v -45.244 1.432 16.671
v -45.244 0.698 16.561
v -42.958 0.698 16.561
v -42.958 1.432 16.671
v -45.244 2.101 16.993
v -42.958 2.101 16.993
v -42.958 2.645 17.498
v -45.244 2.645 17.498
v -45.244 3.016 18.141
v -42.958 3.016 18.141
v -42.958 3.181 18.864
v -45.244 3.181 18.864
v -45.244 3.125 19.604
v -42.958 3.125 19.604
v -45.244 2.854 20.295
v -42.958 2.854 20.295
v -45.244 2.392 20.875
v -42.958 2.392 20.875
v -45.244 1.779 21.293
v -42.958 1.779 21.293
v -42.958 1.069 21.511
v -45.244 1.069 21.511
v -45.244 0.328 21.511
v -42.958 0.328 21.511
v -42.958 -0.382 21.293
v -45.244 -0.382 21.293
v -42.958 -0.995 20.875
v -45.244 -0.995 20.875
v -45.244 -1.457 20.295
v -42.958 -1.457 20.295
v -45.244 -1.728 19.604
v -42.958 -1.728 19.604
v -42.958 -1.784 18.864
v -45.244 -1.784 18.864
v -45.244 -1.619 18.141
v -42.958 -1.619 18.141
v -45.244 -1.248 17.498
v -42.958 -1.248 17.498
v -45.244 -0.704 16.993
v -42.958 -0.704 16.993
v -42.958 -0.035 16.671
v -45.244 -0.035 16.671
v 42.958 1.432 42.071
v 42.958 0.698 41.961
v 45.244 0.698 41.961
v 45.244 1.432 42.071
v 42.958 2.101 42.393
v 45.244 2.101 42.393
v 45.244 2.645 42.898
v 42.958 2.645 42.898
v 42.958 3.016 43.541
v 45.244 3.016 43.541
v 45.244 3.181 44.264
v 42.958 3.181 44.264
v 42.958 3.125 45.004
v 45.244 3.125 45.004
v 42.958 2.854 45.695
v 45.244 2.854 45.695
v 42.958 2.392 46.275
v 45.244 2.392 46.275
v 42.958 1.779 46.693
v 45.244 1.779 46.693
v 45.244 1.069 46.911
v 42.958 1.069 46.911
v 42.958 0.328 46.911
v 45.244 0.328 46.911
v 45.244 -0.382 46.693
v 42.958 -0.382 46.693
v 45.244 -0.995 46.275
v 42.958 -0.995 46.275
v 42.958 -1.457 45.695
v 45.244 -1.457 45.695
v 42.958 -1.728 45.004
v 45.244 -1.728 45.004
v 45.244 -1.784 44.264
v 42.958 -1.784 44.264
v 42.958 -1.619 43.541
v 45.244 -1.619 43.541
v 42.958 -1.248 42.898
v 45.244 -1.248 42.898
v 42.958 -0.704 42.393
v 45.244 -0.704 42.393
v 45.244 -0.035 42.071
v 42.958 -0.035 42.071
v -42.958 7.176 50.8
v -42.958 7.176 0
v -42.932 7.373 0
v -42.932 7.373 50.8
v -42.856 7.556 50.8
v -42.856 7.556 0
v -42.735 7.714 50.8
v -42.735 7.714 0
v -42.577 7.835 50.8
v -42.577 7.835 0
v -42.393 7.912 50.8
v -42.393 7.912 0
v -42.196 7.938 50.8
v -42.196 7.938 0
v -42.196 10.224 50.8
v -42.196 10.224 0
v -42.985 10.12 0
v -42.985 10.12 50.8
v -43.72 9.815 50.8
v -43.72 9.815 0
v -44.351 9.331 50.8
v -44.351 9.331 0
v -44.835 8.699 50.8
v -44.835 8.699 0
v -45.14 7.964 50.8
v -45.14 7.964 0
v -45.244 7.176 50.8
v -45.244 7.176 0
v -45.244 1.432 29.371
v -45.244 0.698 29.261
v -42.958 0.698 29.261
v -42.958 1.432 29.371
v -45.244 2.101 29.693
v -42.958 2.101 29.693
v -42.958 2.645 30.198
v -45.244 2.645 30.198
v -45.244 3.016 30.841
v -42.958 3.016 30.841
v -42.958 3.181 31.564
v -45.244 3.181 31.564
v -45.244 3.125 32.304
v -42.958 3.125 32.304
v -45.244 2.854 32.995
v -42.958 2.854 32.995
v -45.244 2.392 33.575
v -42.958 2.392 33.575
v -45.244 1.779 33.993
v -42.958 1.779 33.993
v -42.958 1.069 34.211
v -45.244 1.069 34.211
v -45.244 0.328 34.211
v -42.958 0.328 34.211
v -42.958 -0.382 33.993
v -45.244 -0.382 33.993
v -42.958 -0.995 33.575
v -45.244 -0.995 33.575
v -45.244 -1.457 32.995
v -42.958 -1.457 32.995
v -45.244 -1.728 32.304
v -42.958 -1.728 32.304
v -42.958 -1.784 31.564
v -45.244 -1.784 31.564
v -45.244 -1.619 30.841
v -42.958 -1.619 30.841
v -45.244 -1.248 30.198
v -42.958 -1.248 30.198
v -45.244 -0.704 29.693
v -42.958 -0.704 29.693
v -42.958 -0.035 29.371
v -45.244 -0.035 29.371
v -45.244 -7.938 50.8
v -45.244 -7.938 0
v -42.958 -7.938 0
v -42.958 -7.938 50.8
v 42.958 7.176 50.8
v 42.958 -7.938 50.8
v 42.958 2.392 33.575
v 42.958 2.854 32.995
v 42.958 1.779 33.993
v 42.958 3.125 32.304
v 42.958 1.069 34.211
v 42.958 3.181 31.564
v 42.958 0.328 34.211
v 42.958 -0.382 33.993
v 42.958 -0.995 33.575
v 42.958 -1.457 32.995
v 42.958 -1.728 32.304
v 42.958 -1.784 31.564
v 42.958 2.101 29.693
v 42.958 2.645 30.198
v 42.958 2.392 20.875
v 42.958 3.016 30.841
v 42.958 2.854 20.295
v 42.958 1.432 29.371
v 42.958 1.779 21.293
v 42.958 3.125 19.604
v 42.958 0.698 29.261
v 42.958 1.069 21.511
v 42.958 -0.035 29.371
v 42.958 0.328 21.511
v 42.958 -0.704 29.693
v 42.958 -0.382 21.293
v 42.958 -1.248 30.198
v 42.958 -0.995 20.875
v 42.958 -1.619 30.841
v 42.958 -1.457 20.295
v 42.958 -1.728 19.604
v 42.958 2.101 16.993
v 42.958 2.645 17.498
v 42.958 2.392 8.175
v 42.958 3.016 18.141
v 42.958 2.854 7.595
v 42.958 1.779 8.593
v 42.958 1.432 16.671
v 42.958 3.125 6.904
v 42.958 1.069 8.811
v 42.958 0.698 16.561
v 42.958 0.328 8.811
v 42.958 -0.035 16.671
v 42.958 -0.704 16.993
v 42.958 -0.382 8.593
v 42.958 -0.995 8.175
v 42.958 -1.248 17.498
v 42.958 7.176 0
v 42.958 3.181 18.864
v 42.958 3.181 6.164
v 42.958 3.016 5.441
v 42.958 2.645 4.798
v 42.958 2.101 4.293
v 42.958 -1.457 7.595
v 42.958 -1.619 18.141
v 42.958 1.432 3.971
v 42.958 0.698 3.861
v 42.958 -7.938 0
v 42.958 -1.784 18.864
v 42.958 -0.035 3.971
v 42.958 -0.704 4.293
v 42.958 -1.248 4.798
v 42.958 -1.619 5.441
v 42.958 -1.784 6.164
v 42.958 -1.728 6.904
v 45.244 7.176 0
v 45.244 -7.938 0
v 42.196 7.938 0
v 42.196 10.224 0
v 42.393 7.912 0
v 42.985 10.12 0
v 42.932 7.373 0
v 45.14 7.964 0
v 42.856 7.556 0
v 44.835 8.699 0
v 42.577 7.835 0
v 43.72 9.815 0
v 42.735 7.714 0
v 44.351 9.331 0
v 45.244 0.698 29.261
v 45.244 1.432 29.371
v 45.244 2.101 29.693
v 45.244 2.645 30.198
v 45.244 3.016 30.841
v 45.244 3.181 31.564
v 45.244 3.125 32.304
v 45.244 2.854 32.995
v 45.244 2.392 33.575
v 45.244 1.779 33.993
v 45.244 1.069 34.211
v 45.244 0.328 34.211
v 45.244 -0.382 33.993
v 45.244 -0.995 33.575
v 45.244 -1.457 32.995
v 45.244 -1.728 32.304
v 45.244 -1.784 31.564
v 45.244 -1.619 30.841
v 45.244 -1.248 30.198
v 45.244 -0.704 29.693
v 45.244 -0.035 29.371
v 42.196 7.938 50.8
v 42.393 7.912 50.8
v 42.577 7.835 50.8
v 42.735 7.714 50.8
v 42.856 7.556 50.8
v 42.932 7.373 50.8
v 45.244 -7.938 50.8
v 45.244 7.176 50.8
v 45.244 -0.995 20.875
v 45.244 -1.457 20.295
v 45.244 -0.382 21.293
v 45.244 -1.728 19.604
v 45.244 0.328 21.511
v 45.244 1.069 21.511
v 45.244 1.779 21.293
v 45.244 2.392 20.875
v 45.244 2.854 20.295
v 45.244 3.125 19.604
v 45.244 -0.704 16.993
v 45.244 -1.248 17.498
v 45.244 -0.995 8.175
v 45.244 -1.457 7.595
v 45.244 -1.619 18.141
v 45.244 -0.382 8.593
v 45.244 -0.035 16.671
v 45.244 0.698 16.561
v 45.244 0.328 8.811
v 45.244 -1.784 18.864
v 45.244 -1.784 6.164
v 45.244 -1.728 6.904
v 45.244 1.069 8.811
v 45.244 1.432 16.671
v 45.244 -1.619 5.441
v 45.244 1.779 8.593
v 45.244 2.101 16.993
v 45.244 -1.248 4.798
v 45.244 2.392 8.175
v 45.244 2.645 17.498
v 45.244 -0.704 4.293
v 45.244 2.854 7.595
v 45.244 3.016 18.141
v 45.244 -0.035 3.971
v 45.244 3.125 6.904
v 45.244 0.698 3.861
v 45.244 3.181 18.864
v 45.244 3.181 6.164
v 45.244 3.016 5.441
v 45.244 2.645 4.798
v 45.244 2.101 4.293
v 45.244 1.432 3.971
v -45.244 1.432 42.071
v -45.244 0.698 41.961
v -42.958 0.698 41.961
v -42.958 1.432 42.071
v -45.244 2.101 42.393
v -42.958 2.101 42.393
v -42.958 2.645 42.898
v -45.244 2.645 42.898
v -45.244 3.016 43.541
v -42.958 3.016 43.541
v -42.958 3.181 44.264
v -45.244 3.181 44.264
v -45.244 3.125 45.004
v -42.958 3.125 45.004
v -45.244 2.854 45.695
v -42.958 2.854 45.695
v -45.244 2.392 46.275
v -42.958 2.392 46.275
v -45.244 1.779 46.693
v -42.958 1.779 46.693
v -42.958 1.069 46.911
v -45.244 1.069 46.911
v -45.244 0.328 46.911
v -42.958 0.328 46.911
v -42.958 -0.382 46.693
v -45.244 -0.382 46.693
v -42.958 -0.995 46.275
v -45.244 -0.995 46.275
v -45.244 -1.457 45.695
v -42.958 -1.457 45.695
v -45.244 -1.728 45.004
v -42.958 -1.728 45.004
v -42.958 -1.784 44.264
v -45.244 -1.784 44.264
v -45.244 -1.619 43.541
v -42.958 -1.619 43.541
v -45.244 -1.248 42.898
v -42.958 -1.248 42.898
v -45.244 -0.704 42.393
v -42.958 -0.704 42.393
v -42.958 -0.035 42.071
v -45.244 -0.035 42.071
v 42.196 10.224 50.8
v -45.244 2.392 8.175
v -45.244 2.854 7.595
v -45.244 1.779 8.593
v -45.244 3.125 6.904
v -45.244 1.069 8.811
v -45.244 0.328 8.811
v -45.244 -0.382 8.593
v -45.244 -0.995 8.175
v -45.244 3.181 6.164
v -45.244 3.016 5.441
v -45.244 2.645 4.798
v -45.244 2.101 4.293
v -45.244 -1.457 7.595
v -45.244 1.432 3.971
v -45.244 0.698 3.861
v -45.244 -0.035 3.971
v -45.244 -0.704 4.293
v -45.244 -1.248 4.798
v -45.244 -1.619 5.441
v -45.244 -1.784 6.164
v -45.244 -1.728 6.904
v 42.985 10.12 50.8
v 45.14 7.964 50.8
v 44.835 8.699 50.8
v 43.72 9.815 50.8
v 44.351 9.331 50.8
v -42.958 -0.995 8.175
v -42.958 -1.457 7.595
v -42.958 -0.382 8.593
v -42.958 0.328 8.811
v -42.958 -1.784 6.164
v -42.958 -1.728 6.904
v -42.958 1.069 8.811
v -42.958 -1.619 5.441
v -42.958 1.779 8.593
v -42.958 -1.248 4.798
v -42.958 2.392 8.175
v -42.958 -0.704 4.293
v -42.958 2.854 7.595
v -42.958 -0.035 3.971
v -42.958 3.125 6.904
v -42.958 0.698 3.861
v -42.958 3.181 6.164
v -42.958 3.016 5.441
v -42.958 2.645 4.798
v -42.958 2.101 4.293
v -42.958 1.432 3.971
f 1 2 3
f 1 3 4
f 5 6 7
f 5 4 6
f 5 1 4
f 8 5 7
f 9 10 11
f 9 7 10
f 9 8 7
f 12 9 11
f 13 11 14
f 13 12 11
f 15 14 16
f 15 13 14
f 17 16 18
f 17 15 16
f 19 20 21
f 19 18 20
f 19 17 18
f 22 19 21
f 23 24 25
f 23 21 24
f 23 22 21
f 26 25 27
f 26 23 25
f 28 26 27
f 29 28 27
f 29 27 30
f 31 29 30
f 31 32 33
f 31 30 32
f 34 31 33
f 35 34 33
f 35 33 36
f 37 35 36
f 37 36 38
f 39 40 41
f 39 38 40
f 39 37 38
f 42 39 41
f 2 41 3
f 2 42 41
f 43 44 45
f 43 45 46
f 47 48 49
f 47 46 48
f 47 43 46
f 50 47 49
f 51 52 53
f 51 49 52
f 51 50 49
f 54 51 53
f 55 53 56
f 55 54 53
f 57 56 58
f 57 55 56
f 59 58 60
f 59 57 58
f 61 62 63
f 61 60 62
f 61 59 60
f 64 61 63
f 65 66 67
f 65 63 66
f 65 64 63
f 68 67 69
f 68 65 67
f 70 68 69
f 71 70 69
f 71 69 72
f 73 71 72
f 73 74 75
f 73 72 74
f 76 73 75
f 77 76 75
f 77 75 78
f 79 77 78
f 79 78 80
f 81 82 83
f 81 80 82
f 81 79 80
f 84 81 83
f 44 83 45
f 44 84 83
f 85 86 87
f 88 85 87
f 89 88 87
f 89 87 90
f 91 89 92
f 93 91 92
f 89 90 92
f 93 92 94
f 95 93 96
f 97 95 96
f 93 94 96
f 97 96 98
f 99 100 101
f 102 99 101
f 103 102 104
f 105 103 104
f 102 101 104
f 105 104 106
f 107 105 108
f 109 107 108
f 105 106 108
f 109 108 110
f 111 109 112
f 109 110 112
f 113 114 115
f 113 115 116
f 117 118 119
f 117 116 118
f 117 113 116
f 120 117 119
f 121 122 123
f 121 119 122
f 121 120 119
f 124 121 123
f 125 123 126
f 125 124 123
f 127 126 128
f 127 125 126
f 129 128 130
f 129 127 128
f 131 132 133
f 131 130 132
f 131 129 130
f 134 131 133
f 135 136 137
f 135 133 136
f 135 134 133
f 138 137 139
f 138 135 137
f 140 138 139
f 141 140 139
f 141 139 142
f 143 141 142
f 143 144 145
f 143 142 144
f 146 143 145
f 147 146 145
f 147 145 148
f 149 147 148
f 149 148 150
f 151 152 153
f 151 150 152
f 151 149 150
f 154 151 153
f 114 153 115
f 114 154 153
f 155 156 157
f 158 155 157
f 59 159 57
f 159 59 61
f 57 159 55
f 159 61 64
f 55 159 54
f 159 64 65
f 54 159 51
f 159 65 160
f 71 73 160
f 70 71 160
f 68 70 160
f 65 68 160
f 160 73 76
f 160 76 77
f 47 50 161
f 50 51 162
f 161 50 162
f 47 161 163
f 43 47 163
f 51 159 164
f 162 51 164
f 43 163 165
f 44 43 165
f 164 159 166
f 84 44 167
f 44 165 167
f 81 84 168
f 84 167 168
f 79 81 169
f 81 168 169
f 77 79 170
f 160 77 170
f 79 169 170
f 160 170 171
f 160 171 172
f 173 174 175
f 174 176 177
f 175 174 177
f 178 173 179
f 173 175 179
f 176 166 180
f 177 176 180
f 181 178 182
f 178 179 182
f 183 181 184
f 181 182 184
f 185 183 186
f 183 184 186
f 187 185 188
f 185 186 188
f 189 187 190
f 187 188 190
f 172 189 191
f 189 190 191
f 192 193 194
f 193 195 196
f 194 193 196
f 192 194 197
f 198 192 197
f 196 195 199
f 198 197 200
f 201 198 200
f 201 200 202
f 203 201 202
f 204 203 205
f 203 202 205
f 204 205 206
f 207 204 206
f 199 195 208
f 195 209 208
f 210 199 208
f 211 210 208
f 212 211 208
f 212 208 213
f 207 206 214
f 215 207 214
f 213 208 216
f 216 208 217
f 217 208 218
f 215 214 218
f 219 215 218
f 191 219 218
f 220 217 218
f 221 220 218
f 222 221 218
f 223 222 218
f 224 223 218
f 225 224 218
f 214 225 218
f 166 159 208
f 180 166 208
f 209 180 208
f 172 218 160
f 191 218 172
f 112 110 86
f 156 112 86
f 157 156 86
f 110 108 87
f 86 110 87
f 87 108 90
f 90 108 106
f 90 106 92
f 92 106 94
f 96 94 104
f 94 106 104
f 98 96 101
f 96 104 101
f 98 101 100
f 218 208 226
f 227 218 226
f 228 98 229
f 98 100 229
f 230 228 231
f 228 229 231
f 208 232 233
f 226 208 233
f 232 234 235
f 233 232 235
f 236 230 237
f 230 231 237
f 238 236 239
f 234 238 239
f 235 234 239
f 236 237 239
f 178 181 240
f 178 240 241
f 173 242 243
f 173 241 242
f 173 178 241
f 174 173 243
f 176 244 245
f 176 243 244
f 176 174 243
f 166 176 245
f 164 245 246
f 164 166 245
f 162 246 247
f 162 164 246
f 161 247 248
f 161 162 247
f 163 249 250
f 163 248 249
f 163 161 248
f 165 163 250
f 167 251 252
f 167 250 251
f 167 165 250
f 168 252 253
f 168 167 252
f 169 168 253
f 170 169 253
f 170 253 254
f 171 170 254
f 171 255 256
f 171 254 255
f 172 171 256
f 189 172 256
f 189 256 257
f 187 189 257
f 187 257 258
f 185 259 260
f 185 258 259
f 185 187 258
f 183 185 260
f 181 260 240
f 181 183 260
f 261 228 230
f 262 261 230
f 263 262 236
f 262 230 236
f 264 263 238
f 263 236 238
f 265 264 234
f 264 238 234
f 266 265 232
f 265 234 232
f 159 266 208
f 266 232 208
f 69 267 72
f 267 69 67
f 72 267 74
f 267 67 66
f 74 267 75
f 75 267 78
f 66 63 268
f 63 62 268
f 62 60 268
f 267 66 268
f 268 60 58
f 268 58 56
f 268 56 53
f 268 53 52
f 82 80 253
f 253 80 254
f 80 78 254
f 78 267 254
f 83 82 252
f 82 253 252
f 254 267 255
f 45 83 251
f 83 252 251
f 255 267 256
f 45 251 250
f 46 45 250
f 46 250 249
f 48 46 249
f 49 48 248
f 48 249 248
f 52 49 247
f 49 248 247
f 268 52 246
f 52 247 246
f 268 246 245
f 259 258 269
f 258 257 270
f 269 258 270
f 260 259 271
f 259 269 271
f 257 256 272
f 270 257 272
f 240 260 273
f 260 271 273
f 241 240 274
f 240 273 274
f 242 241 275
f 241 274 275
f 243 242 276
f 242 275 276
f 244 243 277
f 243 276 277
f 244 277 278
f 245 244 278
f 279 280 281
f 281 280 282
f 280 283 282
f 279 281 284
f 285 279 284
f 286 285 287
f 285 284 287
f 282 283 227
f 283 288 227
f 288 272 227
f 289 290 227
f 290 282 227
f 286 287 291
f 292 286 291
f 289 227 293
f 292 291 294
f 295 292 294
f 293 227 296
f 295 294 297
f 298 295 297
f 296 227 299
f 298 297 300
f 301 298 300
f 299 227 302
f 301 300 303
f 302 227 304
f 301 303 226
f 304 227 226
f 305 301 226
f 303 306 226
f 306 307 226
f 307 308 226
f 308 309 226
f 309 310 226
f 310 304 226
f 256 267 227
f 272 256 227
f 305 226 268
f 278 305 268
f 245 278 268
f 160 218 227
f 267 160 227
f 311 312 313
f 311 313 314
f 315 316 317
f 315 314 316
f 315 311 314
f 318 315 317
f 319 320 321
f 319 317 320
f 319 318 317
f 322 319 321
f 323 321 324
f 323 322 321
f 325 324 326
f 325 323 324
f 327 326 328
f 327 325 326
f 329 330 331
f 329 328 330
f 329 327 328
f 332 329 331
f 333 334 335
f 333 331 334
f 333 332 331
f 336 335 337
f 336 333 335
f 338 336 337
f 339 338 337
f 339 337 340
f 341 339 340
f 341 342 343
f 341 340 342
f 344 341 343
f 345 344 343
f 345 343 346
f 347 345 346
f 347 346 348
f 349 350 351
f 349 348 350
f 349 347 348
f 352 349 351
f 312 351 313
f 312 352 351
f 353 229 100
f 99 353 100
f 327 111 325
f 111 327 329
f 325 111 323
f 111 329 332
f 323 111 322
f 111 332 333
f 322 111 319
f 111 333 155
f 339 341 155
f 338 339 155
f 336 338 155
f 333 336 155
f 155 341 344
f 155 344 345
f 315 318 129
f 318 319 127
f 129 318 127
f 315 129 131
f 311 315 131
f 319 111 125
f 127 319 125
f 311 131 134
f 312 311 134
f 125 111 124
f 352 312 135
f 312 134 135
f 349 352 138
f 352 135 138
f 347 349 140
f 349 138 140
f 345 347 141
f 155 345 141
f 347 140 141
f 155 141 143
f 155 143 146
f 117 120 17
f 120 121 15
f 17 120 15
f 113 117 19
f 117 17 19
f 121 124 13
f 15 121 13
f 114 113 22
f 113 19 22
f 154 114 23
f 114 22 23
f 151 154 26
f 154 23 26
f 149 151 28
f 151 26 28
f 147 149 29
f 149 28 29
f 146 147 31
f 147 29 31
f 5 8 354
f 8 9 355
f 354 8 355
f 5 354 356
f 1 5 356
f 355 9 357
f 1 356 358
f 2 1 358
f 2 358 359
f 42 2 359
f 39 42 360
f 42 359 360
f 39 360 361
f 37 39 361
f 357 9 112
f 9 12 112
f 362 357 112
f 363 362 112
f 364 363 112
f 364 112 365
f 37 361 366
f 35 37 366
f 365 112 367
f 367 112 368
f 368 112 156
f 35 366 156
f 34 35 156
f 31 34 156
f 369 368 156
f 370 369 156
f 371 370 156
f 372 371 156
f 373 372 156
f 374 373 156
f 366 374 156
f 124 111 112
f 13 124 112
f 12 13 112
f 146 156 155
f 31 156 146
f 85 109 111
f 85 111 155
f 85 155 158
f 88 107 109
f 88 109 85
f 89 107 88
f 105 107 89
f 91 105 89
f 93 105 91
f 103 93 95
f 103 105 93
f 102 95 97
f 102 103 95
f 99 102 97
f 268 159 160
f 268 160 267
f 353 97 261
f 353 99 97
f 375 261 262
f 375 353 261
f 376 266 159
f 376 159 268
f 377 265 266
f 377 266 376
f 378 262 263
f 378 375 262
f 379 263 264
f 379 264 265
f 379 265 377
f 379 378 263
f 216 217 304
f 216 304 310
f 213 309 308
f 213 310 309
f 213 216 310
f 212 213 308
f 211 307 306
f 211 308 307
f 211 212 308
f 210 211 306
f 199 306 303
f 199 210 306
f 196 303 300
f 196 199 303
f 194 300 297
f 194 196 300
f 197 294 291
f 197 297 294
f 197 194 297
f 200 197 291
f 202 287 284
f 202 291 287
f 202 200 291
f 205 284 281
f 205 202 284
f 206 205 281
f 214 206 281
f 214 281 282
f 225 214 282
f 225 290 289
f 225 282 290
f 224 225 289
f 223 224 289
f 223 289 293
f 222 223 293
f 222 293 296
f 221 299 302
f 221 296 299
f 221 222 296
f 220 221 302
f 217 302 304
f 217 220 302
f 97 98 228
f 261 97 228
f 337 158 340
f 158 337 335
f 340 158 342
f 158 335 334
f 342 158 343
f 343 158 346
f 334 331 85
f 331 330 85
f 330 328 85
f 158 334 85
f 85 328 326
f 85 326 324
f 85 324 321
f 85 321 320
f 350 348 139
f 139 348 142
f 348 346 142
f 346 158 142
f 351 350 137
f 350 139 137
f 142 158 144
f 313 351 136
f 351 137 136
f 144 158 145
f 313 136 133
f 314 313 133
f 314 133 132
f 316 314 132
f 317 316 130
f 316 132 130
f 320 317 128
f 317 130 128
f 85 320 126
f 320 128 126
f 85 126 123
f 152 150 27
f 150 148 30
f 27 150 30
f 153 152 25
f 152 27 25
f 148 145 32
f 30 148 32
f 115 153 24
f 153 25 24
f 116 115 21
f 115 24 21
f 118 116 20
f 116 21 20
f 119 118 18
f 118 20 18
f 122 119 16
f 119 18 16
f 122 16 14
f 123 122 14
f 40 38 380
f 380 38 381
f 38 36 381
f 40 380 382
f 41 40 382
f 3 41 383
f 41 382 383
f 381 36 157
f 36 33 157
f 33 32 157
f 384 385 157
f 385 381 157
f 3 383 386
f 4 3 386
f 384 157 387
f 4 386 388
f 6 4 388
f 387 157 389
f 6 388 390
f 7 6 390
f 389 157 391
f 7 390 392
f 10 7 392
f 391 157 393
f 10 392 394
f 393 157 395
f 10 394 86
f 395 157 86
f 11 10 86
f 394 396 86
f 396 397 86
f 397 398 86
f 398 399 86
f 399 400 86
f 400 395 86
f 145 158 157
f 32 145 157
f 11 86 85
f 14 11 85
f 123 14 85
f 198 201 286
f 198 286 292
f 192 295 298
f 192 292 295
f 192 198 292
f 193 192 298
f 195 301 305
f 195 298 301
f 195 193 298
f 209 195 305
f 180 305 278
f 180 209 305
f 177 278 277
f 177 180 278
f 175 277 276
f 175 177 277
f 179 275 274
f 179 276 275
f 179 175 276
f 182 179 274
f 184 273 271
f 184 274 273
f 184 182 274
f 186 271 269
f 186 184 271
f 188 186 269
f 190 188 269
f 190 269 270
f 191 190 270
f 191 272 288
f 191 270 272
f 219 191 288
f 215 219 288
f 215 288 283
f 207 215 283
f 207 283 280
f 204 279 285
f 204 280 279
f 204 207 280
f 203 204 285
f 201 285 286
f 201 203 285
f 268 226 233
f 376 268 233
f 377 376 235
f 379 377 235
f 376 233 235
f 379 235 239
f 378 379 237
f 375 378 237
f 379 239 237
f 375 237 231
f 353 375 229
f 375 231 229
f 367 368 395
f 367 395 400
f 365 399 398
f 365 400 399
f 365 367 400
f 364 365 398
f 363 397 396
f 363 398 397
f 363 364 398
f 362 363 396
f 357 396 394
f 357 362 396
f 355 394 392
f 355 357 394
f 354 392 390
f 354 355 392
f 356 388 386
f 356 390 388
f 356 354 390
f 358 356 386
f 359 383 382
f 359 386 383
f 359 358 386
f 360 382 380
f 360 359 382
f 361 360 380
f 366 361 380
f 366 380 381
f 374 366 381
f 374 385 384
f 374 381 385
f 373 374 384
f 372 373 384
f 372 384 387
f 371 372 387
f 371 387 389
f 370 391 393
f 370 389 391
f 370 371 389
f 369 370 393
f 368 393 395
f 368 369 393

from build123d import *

# Parameters (mm, degrees)
BASE_FLANGE1_DEPTH      = 50.8
CUT_EXTRUDE1_DEPTH      = 69.790674268
CUT_EXTRUDE1_DEPTH_BACK = 69.790674268
SKETCH3_R               = 2.4892


# Sheet-metal steps are written as plain solids
with BuildPart() as part:
    # Sketch1 → Base-Flange1 (new body)
    with BuildSketch(Plane.XY):
        with BuildLine():
            Line((-42.95775, -7.9375), (-42.95775, 7.1755))
            ThreePointArc((-42.95775, 7.1755), (-42.734565367, 7.714315367), (-42.19575, 7.9375))
            Line((-42.19575, 7.9375), (42.19575, 7.9375))
            ThreePointArc((42.19575, 7.9375), (42.734565367, 7.714315367), (42.95775, 7.1755))
            Line((42.95775, 7.1755), (42.95775, -7.9375))
            Line((42.95775, -7.9375), (45.24375, -7.9375))
            Line((45.24375, -7.9375), (45.24375, 7.1755))
            ThreePointArc((45.24375, 7.1755), (44.351011469, 9.330761469), (42.19575, 10.2235))
            Line((42.19575, 10.2235), (-42.19575, 10.2235))
            ThreePointArc((-42.19575, 10.2235), (-44.351011469, 9.330761469), (-45.24375, 7.1755))
            Line((-45.24375, 7.1755), (-45.24375, -7.9375))
            Line((-45.24375, -7.9375), (-42.95775, -7.9375))
        make_face()
    extrude(amount=BASE_FLANGE1_DEPTH)

    # Sketch3 → Cut-Extrude1 (cut, two sides: drawn at the far end of the back side and taken through both)
    with BuildSketch(Plane(origin=(0, 0, 0), x_dir=(0, 0, -1), z_dir=(1, 0, 0)).offset(-CUT_EXTRUDE1_DEPTH_BACK)):
        with Locations((-6.35, 0.6985)):
            Circle(SKETCH3_R)
        with Locations((-19.05, 0.6985)):
            Circle(SKETCH3_R)
        with Locations((-31.75, 0.6985)):
            Circle(SKETCH3_R)
        with Locations((-44.45, 0.6985)):
            Circle(SKETCH3_R)
    extrude(amount=CUT_EXTRUDE1_DEPTH + CUT_EXTRUDE1_DEPTH_BACK, mode=Mode.SUBTRACT)


solid = part.part
